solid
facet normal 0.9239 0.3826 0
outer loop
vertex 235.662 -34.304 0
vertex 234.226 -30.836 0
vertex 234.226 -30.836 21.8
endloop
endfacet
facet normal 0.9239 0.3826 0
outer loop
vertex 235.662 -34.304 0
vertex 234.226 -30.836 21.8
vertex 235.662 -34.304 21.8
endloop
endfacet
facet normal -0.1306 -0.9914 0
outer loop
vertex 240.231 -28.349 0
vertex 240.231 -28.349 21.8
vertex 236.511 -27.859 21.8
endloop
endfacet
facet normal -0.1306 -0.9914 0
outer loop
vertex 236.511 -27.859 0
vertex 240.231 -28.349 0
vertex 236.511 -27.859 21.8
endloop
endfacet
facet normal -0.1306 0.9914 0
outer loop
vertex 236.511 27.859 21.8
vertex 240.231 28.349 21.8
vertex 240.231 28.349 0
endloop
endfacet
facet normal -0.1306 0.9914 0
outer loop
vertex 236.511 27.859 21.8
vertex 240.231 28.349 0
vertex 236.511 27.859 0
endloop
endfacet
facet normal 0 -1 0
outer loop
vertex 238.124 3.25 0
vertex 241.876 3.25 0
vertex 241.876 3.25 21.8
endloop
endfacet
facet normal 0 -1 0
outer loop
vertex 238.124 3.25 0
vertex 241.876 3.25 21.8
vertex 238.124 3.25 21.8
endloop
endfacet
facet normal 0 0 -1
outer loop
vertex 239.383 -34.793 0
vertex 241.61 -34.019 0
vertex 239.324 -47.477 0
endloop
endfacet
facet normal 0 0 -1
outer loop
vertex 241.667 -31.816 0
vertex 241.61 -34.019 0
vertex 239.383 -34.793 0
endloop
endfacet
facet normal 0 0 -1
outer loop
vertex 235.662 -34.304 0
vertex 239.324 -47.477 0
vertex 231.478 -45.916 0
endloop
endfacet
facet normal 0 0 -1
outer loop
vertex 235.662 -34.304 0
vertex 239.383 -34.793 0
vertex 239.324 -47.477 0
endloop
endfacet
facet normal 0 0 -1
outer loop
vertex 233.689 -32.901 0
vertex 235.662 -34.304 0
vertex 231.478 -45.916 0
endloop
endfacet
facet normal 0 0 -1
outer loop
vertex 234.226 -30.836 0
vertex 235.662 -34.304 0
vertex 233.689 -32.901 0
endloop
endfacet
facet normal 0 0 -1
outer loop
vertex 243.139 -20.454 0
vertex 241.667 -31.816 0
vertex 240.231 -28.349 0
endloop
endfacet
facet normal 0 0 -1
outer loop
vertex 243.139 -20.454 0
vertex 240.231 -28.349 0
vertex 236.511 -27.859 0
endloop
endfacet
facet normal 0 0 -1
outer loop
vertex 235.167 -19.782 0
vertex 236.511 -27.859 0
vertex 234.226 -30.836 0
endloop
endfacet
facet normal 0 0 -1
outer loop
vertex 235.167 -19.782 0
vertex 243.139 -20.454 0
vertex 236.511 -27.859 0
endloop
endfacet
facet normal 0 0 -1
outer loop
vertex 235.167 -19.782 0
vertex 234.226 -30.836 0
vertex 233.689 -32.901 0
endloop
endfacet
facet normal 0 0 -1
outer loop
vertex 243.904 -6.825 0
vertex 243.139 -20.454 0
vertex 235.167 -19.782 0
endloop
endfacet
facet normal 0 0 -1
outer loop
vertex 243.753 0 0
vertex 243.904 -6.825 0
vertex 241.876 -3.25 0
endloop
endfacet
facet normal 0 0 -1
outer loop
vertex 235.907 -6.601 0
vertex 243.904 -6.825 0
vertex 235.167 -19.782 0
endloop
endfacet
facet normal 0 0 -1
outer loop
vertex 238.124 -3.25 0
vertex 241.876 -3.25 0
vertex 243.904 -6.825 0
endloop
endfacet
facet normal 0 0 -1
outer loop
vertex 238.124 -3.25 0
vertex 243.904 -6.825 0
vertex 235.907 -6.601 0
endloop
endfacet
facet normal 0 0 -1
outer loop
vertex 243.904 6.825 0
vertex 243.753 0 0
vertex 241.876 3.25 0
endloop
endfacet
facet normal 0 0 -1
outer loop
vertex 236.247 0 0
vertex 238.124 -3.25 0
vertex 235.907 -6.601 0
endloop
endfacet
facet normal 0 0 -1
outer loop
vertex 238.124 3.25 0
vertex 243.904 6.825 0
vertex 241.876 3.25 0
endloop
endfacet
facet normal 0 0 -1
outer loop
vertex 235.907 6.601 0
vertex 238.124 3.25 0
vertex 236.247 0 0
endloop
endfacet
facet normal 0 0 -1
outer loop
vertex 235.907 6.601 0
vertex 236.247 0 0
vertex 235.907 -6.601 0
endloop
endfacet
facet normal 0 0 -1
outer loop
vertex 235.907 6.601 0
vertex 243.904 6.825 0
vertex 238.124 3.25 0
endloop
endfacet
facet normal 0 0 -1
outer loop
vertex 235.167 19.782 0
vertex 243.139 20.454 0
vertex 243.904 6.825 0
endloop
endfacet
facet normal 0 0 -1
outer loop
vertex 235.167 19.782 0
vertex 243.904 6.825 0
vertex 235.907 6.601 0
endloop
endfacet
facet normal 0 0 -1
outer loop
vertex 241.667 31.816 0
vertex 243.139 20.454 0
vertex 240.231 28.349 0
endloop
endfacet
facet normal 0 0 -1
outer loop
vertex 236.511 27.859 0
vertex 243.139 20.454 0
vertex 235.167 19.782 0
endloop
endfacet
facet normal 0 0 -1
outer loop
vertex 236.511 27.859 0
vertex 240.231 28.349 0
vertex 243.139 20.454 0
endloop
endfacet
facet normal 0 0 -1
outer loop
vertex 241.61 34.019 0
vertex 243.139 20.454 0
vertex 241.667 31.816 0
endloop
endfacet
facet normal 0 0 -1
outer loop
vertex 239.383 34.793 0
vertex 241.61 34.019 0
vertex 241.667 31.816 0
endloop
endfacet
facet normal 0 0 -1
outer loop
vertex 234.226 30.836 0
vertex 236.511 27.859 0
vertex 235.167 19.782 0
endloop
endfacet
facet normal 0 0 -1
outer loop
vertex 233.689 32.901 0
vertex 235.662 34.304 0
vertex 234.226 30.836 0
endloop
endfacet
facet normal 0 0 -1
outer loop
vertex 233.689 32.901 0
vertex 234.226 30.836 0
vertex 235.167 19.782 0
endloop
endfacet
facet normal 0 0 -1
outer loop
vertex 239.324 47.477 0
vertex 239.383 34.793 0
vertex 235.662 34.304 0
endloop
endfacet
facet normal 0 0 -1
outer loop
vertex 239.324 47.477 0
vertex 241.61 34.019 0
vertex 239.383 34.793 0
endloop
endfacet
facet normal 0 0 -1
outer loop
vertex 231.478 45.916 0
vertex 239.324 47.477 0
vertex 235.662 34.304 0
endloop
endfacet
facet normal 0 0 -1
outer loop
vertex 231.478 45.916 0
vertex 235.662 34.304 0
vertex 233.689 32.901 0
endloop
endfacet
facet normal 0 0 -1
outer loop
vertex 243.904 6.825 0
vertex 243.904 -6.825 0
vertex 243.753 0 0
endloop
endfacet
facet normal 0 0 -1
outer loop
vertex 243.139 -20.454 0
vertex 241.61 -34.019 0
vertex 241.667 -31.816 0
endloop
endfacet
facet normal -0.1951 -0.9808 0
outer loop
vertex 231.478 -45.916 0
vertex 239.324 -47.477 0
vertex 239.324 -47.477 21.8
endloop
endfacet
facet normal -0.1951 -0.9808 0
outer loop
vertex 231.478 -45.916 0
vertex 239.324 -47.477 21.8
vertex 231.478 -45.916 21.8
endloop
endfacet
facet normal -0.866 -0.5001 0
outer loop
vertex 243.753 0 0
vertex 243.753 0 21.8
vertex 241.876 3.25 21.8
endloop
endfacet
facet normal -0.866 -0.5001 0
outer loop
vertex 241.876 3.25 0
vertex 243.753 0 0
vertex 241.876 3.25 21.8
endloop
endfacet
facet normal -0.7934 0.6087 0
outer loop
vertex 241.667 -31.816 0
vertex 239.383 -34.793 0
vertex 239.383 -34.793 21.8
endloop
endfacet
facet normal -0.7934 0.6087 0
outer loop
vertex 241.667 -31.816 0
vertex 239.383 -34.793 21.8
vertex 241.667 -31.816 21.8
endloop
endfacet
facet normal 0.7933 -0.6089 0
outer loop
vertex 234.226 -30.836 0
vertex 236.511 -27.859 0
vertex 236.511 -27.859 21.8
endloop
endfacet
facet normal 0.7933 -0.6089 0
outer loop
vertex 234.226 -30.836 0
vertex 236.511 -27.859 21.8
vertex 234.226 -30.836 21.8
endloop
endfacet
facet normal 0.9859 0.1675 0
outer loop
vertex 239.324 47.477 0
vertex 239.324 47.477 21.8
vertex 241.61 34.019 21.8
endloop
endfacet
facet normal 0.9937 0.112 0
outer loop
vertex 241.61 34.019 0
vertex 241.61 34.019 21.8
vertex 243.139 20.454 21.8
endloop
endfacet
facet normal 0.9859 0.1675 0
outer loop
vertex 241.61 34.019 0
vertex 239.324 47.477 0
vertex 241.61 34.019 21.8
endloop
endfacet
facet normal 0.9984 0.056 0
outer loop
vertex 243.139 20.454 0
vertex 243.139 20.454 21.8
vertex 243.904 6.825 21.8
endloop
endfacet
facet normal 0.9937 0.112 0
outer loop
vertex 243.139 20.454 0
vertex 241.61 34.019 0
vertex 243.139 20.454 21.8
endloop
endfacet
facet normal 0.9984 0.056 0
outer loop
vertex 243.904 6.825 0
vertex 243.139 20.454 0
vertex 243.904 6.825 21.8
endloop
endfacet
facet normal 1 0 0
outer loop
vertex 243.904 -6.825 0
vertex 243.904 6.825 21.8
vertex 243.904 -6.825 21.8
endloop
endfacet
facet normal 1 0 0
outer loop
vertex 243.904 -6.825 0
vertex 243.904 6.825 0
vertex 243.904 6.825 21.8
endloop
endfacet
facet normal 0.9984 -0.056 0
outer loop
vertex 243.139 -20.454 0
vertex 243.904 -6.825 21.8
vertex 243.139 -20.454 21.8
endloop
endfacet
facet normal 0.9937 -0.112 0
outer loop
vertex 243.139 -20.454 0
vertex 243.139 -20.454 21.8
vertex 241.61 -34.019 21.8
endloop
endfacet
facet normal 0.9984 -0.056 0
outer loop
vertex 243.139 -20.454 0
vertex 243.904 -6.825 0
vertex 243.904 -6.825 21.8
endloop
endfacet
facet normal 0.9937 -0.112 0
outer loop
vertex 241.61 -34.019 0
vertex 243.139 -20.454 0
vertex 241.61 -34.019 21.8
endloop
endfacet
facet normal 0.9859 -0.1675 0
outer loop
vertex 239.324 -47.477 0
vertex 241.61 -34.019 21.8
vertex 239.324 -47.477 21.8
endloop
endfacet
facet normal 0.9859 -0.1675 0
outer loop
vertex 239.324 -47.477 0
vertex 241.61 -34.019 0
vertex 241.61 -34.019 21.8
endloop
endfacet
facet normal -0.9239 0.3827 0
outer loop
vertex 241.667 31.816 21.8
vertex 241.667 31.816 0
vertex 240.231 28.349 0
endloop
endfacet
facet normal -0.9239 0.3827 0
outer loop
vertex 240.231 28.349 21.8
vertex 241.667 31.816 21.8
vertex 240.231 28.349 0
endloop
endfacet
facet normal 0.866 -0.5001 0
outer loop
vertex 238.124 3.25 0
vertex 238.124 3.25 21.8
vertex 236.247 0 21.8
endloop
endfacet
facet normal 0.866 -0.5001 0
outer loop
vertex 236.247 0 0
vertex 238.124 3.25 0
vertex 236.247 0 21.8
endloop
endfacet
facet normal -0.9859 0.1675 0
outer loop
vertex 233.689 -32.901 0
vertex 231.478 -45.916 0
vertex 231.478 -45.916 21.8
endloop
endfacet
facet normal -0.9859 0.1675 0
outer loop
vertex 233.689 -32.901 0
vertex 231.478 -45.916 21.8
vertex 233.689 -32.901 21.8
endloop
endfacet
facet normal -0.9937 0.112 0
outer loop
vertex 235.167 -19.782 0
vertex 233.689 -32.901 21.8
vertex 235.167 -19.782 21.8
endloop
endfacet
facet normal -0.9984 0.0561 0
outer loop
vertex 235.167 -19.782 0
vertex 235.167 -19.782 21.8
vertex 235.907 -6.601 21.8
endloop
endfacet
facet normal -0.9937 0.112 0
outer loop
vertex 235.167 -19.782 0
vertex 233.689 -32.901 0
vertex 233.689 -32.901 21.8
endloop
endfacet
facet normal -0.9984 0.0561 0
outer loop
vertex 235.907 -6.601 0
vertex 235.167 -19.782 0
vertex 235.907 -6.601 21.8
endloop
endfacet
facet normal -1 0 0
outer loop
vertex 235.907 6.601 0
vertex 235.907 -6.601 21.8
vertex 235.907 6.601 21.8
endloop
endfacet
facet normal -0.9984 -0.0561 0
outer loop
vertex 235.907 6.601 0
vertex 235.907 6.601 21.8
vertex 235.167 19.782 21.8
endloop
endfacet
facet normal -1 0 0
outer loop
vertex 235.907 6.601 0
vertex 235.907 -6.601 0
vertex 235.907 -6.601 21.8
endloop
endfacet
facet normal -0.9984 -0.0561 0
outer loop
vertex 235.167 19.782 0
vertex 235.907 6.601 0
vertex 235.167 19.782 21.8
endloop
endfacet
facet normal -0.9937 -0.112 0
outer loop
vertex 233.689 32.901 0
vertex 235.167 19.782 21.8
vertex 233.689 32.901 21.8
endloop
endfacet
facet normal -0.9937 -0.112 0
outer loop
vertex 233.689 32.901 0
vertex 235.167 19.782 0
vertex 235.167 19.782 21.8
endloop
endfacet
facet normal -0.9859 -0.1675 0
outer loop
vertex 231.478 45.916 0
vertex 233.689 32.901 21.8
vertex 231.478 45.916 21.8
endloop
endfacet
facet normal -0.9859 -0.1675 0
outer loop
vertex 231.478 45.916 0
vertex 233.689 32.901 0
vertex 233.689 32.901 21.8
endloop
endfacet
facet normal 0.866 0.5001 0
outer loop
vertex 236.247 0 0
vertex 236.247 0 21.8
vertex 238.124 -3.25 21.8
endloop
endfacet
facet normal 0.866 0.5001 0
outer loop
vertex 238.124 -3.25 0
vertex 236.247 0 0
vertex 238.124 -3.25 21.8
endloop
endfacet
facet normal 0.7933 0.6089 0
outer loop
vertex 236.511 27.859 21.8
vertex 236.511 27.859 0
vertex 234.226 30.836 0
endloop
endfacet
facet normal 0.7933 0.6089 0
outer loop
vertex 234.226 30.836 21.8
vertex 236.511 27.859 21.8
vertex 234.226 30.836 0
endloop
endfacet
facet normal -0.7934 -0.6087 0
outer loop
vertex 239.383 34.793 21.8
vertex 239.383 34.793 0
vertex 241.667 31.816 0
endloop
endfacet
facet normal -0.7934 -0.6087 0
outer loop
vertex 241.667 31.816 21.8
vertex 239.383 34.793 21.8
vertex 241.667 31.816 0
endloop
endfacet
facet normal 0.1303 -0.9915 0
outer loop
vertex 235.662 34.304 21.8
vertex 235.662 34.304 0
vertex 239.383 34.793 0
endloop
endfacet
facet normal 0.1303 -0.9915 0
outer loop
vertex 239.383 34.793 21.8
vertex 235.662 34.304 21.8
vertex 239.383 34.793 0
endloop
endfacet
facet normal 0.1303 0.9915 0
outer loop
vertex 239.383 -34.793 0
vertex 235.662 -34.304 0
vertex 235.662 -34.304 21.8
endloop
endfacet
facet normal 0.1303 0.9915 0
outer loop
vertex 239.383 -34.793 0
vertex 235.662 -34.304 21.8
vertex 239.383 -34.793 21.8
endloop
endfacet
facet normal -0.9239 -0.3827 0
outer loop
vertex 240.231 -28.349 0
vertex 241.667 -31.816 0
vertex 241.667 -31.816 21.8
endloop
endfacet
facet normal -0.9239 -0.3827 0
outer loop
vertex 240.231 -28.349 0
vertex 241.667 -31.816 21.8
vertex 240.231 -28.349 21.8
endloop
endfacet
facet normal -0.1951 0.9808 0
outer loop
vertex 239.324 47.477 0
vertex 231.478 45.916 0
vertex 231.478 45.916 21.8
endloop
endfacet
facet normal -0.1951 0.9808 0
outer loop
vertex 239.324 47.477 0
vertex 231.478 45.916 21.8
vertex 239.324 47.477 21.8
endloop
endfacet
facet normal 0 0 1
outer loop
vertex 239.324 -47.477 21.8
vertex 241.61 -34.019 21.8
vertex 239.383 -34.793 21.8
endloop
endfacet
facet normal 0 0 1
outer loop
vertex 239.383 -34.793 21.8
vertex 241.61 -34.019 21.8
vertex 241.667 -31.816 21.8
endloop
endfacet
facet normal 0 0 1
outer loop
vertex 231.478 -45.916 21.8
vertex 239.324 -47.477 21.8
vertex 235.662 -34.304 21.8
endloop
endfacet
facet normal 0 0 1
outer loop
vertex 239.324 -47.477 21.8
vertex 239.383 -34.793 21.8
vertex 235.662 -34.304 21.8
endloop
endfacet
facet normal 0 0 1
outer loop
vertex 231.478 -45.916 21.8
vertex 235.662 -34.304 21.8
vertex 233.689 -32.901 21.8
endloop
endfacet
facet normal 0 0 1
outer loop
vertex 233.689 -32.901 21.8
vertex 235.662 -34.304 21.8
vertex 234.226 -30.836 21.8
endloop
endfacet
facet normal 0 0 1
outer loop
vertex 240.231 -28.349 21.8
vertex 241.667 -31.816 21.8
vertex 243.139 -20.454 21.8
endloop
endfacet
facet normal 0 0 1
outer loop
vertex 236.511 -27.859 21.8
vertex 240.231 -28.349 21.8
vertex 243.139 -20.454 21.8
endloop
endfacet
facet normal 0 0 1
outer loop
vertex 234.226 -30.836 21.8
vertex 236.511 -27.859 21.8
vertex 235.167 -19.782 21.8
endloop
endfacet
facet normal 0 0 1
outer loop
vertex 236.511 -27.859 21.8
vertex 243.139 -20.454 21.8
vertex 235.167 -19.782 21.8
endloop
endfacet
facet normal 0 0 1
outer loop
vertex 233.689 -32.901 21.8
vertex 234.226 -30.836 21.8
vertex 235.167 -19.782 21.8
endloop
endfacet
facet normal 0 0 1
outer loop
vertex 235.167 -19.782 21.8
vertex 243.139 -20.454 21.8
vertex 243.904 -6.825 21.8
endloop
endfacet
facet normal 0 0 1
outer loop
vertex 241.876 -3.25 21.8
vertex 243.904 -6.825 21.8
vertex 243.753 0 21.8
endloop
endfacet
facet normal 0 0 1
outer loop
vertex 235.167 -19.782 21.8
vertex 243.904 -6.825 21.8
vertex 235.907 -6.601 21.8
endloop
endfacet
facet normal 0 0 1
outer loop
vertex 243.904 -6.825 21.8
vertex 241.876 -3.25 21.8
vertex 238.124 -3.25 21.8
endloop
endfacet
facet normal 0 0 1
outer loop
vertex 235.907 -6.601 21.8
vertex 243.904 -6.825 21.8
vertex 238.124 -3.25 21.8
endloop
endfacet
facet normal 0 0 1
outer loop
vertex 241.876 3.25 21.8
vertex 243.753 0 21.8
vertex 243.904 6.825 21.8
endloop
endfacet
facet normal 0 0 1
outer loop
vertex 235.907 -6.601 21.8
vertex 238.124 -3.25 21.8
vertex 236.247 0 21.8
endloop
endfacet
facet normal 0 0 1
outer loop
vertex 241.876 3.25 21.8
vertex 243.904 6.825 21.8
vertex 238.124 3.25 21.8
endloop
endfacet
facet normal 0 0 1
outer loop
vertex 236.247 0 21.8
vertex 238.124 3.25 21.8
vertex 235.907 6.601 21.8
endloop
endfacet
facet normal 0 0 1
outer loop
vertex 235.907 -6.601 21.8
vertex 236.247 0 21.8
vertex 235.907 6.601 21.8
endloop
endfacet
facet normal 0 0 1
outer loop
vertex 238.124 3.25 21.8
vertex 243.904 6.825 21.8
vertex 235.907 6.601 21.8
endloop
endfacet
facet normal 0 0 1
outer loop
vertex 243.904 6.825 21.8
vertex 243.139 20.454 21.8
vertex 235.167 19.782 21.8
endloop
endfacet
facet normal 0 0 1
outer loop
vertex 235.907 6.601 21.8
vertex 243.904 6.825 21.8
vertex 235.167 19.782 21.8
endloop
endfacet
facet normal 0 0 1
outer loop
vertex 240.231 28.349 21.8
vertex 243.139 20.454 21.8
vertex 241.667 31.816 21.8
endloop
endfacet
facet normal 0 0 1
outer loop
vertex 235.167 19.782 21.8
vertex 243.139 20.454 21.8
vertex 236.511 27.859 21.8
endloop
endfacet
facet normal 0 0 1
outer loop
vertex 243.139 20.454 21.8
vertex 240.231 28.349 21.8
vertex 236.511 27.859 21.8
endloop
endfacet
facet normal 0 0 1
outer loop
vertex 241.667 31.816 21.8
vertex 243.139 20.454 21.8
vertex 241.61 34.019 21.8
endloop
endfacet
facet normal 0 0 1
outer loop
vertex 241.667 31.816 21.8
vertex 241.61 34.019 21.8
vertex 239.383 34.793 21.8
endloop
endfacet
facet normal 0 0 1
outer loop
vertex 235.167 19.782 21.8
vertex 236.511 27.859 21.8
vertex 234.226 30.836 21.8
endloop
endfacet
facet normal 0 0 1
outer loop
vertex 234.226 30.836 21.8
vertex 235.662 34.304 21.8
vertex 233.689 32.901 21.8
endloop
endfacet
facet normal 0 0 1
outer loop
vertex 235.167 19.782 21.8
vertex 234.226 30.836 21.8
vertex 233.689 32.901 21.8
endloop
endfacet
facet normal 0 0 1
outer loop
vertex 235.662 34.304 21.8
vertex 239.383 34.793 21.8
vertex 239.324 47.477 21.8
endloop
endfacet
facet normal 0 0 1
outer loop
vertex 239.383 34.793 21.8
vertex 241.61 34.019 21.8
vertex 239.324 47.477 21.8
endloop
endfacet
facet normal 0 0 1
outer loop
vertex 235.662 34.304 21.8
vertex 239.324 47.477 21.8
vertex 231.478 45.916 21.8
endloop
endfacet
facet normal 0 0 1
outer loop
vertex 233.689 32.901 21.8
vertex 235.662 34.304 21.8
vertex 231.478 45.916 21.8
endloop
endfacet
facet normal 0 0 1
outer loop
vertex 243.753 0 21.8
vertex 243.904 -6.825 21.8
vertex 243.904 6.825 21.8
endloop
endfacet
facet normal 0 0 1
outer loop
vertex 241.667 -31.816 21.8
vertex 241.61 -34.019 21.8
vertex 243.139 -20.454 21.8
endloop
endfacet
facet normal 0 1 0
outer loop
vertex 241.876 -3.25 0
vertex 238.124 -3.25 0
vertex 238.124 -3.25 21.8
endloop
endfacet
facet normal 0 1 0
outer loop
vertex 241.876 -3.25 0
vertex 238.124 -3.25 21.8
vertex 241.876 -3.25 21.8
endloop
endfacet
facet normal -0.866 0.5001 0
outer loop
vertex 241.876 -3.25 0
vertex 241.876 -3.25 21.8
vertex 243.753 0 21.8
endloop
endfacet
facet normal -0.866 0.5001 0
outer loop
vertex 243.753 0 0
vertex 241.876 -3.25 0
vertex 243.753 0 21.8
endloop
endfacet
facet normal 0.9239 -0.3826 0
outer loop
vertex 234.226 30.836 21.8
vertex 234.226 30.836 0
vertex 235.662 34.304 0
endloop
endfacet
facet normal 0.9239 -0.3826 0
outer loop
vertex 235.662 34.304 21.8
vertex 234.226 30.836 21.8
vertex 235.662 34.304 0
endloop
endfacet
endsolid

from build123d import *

# Parameters (mm, degrees)
BOSS_EXTRUDE1_DEPTH = 21.8


with BuildPart() as part:
    # Sketch1 → Boss-Extrude1 (new body)
    with BuildSketch(Plane.XY):
        with BuildLine():
            Line((239.323919844, -47.477038572), (231.477637601, -45.916315996))
            ThreePointArc((231.477637601, -45.916315996), (236, 0), (231.477637601, 45.916315996))
            Line((231.477637601, 45.916315996), (239.323919844, 47.477038572))
            ThreePointArc((239.323919844, 47.477038572), (244, 0), (239.323919844, -47.477038572))
        make_face()
        Polygon((236.510641242, 27.859172504), (234.226095505, 30.836450473), (235.662220993, 34.303564103), (239.382892217, 34.793399762), (241.667437954, 31.816121792), (240.231312467, 28.349008163), align=None, mode=Mode.SUBTRACT)
        Polygon((241.876388375, -3.25), (243.75277675, 0), (241.876388375, 3.25), (238.123611625, 3.25), (236.24722325, 0), (238.123611625, -3.25), align=None, mode=Mode.SUBTRACT)
        Polygon((235.662220993, -34.303564103), (239.382892217, -34.793399762), (241.667437954, -31.816121792), (240.231312467, -28.349008163), (236.510641242, -27.859172504), (234.226095505, -30.836450473), align=None, mode=Mode.SUBTRACT)
    extrude(amount=BOSS_EXTRUDE1_DEPTH)


solid = part.part
